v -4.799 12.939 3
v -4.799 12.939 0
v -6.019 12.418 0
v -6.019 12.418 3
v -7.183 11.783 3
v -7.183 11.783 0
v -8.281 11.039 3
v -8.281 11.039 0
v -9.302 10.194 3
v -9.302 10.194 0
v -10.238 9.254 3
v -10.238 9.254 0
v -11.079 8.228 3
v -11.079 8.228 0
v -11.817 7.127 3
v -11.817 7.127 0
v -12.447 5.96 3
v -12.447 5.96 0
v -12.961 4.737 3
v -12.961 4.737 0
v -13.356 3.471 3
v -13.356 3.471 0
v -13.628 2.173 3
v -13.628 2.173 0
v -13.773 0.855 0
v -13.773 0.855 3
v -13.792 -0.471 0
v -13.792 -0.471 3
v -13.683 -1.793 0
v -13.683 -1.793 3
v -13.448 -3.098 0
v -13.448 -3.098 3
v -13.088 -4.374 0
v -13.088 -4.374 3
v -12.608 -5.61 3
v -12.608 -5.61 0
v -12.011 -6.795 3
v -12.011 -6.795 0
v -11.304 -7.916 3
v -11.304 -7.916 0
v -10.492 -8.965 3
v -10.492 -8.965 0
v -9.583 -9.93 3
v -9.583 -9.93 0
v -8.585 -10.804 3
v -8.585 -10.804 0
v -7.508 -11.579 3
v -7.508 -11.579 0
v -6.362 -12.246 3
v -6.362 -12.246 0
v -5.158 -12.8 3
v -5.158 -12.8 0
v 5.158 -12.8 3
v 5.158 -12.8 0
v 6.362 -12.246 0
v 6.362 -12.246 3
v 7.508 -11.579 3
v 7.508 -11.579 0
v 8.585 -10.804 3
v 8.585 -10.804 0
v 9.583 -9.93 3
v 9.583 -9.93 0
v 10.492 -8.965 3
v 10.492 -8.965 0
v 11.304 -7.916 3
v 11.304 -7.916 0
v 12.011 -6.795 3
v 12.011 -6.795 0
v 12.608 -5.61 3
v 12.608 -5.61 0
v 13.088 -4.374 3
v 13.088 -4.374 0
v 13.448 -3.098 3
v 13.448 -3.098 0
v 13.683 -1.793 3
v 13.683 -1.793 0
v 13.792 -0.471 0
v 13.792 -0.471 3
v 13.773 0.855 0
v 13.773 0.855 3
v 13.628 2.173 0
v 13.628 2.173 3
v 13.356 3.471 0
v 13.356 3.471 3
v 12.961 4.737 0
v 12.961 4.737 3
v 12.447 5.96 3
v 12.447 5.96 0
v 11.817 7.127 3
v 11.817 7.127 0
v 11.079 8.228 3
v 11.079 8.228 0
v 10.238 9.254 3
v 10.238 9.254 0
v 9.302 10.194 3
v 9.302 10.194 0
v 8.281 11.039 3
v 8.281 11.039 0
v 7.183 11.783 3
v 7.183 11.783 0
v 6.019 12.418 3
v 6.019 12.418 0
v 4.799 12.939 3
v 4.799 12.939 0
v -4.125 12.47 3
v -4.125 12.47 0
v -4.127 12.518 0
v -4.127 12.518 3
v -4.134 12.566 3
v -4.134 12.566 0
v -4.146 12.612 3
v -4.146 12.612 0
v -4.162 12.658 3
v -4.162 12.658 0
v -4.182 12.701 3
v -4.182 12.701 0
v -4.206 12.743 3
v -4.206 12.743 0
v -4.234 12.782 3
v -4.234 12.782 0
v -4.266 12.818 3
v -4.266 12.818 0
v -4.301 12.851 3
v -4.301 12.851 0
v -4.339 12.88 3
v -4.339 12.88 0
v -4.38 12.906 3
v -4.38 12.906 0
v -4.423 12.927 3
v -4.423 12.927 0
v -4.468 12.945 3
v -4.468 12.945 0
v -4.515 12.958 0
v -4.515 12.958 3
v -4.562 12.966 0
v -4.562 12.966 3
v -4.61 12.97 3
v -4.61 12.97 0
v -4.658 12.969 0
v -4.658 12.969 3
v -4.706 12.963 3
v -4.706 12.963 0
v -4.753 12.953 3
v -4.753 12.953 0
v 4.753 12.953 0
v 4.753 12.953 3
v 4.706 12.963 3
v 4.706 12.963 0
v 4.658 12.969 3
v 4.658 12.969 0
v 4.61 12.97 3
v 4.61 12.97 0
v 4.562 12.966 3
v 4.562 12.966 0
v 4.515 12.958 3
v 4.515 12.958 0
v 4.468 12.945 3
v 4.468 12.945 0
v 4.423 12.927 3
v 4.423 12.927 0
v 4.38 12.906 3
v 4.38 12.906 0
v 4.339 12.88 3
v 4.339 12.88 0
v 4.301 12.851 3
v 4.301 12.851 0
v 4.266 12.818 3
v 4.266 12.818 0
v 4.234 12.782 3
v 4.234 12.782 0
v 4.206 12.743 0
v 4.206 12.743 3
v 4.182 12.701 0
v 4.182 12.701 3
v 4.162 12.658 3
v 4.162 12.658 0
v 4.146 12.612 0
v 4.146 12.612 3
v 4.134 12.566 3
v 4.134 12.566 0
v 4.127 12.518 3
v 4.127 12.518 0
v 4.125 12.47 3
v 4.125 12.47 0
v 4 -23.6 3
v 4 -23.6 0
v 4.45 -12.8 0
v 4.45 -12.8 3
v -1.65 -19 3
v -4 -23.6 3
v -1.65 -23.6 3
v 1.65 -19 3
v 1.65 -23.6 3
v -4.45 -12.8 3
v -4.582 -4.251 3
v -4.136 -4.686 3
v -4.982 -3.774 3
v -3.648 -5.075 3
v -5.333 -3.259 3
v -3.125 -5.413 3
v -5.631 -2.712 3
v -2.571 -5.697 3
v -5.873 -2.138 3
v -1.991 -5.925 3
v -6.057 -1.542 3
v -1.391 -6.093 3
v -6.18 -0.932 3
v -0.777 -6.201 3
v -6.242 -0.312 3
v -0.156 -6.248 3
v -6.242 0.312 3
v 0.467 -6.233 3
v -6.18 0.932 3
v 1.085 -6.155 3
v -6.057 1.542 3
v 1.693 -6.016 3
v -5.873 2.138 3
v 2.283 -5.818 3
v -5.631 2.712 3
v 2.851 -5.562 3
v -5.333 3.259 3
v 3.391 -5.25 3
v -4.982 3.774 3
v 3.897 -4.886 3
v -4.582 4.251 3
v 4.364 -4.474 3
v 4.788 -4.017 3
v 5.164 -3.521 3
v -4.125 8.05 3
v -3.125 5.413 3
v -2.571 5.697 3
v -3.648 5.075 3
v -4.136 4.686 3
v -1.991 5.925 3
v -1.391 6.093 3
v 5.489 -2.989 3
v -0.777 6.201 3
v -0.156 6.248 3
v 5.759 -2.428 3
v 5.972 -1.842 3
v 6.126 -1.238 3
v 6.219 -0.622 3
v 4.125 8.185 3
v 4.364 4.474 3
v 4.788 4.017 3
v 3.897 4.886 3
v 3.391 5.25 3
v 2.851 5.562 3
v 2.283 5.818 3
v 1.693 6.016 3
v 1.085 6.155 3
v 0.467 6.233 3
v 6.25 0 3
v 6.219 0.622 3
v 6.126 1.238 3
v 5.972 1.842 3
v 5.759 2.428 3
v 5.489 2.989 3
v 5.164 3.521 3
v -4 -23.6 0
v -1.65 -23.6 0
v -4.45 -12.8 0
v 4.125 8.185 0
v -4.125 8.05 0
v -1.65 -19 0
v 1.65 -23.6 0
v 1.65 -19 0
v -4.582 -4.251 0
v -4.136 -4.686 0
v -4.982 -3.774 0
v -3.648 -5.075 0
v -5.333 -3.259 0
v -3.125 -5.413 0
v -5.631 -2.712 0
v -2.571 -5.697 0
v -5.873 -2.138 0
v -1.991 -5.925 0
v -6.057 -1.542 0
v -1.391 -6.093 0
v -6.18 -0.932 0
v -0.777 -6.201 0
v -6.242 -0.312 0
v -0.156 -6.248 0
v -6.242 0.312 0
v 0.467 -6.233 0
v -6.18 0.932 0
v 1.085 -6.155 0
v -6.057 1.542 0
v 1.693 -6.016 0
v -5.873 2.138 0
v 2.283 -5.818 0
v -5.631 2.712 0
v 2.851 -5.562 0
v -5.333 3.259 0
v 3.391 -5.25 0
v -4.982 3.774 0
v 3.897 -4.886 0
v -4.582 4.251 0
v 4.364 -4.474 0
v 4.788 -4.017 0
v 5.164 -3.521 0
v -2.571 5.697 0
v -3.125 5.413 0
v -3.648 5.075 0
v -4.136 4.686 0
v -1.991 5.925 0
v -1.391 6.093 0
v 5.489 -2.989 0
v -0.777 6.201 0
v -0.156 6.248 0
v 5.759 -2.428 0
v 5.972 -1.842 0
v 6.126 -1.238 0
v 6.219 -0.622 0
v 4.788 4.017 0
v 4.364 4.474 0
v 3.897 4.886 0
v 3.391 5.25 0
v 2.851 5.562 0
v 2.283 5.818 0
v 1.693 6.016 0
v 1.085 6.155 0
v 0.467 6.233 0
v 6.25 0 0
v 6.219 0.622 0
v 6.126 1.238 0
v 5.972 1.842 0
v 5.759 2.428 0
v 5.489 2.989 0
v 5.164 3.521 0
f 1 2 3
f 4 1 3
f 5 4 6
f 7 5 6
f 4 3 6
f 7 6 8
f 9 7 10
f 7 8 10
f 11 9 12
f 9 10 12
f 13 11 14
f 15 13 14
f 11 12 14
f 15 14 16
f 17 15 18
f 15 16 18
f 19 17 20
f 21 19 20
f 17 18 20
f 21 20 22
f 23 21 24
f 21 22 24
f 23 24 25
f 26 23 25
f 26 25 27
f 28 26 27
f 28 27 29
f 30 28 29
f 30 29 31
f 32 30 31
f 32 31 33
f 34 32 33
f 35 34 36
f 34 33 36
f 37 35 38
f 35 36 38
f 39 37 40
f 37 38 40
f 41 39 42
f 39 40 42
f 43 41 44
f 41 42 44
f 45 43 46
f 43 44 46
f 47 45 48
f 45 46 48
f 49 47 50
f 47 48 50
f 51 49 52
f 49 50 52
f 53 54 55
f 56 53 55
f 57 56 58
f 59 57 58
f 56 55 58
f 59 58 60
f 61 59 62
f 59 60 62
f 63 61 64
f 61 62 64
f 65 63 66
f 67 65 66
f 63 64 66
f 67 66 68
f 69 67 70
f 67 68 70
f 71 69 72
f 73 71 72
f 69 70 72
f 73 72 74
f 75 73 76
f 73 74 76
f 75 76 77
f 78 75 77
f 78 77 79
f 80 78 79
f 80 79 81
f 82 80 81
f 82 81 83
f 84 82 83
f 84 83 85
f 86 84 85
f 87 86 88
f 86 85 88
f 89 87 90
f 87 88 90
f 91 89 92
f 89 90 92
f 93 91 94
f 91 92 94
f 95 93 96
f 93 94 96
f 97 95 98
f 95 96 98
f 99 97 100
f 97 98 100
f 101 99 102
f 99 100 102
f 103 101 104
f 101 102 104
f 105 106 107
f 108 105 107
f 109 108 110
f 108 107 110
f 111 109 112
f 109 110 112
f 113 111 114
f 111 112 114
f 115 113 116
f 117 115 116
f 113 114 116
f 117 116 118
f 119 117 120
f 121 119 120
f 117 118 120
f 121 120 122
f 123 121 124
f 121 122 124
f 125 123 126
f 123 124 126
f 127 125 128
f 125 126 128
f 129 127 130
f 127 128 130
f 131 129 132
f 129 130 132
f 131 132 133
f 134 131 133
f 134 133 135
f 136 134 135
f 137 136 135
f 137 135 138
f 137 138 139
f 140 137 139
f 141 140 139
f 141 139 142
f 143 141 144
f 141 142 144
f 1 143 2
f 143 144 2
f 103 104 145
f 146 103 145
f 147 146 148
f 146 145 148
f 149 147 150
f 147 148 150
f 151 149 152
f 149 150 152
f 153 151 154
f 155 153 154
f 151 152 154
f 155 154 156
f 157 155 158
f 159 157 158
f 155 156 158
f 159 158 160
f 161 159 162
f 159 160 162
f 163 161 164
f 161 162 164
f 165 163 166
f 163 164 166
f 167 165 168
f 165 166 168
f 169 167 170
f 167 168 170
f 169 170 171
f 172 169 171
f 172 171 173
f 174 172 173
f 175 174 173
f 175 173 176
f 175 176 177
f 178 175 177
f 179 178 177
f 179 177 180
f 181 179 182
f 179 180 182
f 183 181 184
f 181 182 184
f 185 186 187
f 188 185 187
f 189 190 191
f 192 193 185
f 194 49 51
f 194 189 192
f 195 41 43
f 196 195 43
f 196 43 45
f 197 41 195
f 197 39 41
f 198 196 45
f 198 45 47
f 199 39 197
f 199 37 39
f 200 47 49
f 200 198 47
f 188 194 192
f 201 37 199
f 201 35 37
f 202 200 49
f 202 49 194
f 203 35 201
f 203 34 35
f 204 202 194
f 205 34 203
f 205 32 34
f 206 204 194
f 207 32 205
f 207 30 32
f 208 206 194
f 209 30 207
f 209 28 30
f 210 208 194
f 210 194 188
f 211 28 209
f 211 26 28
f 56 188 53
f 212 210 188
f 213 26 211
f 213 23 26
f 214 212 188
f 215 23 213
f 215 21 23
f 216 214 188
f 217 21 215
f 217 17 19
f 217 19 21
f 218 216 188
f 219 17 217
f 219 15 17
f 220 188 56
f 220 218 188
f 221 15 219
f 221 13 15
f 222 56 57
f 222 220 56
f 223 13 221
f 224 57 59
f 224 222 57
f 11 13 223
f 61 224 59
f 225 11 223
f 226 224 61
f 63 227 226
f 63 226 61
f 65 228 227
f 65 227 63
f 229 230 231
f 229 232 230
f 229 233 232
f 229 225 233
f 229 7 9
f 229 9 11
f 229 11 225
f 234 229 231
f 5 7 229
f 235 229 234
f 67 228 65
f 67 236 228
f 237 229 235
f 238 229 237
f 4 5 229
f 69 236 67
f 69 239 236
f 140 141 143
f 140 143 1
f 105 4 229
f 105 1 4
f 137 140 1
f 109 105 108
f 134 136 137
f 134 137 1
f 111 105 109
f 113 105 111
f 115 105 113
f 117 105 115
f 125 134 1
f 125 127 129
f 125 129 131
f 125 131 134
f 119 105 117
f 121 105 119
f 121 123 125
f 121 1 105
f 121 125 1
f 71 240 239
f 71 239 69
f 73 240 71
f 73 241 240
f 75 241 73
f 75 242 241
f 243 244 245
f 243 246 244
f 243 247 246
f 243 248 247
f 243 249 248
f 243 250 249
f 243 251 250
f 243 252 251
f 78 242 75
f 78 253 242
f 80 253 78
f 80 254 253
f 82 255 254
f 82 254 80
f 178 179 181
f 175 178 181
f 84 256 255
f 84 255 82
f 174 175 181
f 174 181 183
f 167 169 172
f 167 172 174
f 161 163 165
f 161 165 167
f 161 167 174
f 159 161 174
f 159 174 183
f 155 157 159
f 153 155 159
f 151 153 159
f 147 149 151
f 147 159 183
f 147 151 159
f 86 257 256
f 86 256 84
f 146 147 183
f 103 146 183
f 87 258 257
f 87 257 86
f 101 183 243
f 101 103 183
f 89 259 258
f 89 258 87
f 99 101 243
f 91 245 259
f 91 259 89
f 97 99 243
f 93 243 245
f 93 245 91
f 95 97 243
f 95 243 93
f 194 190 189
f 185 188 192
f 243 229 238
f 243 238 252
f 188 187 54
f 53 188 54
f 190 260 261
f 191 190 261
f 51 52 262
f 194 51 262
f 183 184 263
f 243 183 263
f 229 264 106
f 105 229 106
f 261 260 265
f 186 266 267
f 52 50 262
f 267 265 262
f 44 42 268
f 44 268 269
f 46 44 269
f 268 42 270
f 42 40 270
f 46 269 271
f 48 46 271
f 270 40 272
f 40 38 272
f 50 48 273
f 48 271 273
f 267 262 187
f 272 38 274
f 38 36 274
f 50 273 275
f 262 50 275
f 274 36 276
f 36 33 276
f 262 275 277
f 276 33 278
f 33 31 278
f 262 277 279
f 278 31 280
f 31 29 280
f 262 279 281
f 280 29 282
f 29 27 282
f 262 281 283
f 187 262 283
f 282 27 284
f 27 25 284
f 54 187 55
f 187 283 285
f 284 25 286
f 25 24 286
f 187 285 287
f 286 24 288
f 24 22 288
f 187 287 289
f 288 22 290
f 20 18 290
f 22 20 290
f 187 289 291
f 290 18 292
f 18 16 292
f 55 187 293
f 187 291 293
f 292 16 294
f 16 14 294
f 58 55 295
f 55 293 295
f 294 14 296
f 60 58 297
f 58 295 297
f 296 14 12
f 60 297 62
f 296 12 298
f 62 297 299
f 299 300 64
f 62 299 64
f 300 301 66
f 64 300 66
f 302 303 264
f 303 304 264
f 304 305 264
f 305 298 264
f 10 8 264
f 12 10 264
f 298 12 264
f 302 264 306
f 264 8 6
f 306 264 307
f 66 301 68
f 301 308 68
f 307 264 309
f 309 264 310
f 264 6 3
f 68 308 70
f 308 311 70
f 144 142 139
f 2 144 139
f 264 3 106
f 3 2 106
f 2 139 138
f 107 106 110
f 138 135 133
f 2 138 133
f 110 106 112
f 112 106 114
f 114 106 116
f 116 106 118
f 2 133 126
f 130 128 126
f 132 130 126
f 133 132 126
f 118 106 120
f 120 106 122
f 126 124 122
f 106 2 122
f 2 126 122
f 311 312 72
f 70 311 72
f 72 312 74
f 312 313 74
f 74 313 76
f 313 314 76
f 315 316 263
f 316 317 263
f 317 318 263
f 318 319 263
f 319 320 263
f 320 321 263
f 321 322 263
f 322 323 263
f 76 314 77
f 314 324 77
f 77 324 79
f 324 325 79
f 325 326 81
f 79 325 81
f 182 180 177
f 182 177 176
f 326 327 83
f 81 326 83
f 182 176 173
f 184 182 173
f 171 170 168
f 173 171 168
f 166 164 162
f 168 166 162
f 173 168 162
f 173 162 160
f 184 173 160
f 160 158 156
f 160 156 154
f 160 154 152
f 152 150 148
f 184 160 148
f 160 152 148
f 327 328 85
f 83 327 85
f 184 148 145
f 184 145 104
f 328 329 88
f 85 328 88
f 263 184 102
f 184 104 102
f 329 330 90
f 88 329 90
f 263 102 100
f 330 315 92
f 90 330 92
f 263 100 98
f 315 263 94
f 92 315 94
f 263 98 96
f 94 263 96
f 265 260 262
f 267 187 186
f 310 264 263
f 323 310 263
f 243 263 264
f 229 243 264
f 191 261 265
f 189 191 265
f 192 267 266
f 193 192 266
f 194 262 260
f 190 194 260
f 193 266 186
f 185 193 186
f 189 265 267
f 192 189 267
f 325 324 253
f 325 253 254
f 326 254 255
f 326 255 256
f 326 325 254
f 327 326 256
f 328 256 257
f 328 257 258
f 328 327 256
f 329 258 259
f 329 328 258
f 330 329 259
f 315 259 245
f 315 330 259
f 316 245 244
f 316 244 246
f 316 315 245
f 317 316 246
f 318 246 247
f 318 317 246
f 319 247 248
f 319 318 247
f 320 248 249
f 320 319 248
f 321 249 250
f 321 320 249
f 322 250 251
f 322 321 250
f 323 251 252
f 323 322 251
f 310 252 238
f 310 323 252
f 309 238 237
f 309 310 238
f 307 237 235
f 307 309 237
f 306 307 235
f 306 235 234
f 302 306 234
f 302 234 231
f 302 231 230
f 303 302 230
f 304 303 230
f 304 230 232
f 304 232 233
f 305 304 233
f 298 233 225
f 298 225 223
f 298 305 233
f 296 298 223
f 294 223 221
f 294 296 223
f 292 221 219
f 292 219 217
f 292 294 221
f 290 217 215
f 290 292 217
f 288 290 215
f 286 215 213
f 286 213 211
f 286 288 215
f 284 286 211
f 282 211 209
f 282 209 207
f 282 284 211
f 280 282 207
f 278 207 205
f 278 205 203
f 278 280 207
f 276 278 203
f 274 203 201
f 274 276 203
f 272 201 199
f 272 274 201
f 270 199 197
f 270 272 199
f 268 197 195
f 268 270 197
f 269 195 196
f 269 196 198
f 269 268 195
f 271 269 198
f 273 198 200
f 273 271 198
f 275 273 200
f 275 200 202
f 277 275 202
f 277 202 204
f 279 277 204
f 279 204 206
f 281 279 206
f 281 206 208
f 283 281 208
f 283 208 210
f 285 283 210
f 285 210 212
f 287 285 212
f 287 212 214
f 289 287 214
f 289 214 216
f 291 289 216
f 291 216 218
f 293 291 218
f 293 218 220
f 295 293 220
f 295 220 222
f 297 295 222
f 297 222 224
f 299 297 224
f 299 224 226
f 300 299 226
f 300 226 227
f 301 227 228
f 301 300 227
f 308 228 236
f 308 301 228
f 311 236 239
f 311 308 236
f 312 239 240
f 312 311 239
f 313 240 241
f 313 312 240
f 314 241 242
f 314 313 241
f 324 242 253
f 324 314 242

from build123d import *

# Parameters (mm, degrees)
SKETCH_1_R      = 6.25
EXTRUDE_1_DEPTH = 3


with BuildPart() as part:
    # Эскиз1 → Бобышка-Вытянуть1 (new body)
    with BuildSketch(Plane.XY):
        with BuildLine():
            Line((-5.157518783, -12.8), (-4.45, -12.8))
            Line((-4.45, -12.8), (-4, -23.6))
            Line((-4, -23.6), (-1.65, -23.6))
            Line((-1.65, -23.6), (-1.65, -19))
            Line((-1.65, -19), (1.65, -19))
            Line((1.65, -19), (1.65, -23.6))
            Line((1.65, -23.6), (4, -23.6))
            Line((4, -23.6), (4.45, -12.8))
            Line((4.45, -12.8), (5.157518783, -12.8))
            ThreePointArc((5.157518783, -12.8), (13.798660493, 0.192272192), (4.79887218, 12.938733547))
            ThreePointArc((4.79887218, 12.938733547), (4.33946199, 12.880387443), (4.125, 12.469938853))
            Line((4.125, 12.469938853), (4.125, 8.185219421))
            Line((4.125, 8.185219421), (-4.125, 8.05))
            Line((-4.125, 8.05), (-4.125, 12.469938853))
            ThreePointArc((-4.125, 12.469938853), (-4.33946199, 12.880387443), (-4.79887218, 12.938733547))
            ThreePointArc((-4.79887218, 12.938733547), (-13.798660493, 0.192272192), (-5.157518783, -12.8))
        make_face()
        Circle(SKETCH_1_R, mode=Mode.SUBTRACT)
    extrude(amount=EXTRUDE_1_DEPTH)


solid = part.part
